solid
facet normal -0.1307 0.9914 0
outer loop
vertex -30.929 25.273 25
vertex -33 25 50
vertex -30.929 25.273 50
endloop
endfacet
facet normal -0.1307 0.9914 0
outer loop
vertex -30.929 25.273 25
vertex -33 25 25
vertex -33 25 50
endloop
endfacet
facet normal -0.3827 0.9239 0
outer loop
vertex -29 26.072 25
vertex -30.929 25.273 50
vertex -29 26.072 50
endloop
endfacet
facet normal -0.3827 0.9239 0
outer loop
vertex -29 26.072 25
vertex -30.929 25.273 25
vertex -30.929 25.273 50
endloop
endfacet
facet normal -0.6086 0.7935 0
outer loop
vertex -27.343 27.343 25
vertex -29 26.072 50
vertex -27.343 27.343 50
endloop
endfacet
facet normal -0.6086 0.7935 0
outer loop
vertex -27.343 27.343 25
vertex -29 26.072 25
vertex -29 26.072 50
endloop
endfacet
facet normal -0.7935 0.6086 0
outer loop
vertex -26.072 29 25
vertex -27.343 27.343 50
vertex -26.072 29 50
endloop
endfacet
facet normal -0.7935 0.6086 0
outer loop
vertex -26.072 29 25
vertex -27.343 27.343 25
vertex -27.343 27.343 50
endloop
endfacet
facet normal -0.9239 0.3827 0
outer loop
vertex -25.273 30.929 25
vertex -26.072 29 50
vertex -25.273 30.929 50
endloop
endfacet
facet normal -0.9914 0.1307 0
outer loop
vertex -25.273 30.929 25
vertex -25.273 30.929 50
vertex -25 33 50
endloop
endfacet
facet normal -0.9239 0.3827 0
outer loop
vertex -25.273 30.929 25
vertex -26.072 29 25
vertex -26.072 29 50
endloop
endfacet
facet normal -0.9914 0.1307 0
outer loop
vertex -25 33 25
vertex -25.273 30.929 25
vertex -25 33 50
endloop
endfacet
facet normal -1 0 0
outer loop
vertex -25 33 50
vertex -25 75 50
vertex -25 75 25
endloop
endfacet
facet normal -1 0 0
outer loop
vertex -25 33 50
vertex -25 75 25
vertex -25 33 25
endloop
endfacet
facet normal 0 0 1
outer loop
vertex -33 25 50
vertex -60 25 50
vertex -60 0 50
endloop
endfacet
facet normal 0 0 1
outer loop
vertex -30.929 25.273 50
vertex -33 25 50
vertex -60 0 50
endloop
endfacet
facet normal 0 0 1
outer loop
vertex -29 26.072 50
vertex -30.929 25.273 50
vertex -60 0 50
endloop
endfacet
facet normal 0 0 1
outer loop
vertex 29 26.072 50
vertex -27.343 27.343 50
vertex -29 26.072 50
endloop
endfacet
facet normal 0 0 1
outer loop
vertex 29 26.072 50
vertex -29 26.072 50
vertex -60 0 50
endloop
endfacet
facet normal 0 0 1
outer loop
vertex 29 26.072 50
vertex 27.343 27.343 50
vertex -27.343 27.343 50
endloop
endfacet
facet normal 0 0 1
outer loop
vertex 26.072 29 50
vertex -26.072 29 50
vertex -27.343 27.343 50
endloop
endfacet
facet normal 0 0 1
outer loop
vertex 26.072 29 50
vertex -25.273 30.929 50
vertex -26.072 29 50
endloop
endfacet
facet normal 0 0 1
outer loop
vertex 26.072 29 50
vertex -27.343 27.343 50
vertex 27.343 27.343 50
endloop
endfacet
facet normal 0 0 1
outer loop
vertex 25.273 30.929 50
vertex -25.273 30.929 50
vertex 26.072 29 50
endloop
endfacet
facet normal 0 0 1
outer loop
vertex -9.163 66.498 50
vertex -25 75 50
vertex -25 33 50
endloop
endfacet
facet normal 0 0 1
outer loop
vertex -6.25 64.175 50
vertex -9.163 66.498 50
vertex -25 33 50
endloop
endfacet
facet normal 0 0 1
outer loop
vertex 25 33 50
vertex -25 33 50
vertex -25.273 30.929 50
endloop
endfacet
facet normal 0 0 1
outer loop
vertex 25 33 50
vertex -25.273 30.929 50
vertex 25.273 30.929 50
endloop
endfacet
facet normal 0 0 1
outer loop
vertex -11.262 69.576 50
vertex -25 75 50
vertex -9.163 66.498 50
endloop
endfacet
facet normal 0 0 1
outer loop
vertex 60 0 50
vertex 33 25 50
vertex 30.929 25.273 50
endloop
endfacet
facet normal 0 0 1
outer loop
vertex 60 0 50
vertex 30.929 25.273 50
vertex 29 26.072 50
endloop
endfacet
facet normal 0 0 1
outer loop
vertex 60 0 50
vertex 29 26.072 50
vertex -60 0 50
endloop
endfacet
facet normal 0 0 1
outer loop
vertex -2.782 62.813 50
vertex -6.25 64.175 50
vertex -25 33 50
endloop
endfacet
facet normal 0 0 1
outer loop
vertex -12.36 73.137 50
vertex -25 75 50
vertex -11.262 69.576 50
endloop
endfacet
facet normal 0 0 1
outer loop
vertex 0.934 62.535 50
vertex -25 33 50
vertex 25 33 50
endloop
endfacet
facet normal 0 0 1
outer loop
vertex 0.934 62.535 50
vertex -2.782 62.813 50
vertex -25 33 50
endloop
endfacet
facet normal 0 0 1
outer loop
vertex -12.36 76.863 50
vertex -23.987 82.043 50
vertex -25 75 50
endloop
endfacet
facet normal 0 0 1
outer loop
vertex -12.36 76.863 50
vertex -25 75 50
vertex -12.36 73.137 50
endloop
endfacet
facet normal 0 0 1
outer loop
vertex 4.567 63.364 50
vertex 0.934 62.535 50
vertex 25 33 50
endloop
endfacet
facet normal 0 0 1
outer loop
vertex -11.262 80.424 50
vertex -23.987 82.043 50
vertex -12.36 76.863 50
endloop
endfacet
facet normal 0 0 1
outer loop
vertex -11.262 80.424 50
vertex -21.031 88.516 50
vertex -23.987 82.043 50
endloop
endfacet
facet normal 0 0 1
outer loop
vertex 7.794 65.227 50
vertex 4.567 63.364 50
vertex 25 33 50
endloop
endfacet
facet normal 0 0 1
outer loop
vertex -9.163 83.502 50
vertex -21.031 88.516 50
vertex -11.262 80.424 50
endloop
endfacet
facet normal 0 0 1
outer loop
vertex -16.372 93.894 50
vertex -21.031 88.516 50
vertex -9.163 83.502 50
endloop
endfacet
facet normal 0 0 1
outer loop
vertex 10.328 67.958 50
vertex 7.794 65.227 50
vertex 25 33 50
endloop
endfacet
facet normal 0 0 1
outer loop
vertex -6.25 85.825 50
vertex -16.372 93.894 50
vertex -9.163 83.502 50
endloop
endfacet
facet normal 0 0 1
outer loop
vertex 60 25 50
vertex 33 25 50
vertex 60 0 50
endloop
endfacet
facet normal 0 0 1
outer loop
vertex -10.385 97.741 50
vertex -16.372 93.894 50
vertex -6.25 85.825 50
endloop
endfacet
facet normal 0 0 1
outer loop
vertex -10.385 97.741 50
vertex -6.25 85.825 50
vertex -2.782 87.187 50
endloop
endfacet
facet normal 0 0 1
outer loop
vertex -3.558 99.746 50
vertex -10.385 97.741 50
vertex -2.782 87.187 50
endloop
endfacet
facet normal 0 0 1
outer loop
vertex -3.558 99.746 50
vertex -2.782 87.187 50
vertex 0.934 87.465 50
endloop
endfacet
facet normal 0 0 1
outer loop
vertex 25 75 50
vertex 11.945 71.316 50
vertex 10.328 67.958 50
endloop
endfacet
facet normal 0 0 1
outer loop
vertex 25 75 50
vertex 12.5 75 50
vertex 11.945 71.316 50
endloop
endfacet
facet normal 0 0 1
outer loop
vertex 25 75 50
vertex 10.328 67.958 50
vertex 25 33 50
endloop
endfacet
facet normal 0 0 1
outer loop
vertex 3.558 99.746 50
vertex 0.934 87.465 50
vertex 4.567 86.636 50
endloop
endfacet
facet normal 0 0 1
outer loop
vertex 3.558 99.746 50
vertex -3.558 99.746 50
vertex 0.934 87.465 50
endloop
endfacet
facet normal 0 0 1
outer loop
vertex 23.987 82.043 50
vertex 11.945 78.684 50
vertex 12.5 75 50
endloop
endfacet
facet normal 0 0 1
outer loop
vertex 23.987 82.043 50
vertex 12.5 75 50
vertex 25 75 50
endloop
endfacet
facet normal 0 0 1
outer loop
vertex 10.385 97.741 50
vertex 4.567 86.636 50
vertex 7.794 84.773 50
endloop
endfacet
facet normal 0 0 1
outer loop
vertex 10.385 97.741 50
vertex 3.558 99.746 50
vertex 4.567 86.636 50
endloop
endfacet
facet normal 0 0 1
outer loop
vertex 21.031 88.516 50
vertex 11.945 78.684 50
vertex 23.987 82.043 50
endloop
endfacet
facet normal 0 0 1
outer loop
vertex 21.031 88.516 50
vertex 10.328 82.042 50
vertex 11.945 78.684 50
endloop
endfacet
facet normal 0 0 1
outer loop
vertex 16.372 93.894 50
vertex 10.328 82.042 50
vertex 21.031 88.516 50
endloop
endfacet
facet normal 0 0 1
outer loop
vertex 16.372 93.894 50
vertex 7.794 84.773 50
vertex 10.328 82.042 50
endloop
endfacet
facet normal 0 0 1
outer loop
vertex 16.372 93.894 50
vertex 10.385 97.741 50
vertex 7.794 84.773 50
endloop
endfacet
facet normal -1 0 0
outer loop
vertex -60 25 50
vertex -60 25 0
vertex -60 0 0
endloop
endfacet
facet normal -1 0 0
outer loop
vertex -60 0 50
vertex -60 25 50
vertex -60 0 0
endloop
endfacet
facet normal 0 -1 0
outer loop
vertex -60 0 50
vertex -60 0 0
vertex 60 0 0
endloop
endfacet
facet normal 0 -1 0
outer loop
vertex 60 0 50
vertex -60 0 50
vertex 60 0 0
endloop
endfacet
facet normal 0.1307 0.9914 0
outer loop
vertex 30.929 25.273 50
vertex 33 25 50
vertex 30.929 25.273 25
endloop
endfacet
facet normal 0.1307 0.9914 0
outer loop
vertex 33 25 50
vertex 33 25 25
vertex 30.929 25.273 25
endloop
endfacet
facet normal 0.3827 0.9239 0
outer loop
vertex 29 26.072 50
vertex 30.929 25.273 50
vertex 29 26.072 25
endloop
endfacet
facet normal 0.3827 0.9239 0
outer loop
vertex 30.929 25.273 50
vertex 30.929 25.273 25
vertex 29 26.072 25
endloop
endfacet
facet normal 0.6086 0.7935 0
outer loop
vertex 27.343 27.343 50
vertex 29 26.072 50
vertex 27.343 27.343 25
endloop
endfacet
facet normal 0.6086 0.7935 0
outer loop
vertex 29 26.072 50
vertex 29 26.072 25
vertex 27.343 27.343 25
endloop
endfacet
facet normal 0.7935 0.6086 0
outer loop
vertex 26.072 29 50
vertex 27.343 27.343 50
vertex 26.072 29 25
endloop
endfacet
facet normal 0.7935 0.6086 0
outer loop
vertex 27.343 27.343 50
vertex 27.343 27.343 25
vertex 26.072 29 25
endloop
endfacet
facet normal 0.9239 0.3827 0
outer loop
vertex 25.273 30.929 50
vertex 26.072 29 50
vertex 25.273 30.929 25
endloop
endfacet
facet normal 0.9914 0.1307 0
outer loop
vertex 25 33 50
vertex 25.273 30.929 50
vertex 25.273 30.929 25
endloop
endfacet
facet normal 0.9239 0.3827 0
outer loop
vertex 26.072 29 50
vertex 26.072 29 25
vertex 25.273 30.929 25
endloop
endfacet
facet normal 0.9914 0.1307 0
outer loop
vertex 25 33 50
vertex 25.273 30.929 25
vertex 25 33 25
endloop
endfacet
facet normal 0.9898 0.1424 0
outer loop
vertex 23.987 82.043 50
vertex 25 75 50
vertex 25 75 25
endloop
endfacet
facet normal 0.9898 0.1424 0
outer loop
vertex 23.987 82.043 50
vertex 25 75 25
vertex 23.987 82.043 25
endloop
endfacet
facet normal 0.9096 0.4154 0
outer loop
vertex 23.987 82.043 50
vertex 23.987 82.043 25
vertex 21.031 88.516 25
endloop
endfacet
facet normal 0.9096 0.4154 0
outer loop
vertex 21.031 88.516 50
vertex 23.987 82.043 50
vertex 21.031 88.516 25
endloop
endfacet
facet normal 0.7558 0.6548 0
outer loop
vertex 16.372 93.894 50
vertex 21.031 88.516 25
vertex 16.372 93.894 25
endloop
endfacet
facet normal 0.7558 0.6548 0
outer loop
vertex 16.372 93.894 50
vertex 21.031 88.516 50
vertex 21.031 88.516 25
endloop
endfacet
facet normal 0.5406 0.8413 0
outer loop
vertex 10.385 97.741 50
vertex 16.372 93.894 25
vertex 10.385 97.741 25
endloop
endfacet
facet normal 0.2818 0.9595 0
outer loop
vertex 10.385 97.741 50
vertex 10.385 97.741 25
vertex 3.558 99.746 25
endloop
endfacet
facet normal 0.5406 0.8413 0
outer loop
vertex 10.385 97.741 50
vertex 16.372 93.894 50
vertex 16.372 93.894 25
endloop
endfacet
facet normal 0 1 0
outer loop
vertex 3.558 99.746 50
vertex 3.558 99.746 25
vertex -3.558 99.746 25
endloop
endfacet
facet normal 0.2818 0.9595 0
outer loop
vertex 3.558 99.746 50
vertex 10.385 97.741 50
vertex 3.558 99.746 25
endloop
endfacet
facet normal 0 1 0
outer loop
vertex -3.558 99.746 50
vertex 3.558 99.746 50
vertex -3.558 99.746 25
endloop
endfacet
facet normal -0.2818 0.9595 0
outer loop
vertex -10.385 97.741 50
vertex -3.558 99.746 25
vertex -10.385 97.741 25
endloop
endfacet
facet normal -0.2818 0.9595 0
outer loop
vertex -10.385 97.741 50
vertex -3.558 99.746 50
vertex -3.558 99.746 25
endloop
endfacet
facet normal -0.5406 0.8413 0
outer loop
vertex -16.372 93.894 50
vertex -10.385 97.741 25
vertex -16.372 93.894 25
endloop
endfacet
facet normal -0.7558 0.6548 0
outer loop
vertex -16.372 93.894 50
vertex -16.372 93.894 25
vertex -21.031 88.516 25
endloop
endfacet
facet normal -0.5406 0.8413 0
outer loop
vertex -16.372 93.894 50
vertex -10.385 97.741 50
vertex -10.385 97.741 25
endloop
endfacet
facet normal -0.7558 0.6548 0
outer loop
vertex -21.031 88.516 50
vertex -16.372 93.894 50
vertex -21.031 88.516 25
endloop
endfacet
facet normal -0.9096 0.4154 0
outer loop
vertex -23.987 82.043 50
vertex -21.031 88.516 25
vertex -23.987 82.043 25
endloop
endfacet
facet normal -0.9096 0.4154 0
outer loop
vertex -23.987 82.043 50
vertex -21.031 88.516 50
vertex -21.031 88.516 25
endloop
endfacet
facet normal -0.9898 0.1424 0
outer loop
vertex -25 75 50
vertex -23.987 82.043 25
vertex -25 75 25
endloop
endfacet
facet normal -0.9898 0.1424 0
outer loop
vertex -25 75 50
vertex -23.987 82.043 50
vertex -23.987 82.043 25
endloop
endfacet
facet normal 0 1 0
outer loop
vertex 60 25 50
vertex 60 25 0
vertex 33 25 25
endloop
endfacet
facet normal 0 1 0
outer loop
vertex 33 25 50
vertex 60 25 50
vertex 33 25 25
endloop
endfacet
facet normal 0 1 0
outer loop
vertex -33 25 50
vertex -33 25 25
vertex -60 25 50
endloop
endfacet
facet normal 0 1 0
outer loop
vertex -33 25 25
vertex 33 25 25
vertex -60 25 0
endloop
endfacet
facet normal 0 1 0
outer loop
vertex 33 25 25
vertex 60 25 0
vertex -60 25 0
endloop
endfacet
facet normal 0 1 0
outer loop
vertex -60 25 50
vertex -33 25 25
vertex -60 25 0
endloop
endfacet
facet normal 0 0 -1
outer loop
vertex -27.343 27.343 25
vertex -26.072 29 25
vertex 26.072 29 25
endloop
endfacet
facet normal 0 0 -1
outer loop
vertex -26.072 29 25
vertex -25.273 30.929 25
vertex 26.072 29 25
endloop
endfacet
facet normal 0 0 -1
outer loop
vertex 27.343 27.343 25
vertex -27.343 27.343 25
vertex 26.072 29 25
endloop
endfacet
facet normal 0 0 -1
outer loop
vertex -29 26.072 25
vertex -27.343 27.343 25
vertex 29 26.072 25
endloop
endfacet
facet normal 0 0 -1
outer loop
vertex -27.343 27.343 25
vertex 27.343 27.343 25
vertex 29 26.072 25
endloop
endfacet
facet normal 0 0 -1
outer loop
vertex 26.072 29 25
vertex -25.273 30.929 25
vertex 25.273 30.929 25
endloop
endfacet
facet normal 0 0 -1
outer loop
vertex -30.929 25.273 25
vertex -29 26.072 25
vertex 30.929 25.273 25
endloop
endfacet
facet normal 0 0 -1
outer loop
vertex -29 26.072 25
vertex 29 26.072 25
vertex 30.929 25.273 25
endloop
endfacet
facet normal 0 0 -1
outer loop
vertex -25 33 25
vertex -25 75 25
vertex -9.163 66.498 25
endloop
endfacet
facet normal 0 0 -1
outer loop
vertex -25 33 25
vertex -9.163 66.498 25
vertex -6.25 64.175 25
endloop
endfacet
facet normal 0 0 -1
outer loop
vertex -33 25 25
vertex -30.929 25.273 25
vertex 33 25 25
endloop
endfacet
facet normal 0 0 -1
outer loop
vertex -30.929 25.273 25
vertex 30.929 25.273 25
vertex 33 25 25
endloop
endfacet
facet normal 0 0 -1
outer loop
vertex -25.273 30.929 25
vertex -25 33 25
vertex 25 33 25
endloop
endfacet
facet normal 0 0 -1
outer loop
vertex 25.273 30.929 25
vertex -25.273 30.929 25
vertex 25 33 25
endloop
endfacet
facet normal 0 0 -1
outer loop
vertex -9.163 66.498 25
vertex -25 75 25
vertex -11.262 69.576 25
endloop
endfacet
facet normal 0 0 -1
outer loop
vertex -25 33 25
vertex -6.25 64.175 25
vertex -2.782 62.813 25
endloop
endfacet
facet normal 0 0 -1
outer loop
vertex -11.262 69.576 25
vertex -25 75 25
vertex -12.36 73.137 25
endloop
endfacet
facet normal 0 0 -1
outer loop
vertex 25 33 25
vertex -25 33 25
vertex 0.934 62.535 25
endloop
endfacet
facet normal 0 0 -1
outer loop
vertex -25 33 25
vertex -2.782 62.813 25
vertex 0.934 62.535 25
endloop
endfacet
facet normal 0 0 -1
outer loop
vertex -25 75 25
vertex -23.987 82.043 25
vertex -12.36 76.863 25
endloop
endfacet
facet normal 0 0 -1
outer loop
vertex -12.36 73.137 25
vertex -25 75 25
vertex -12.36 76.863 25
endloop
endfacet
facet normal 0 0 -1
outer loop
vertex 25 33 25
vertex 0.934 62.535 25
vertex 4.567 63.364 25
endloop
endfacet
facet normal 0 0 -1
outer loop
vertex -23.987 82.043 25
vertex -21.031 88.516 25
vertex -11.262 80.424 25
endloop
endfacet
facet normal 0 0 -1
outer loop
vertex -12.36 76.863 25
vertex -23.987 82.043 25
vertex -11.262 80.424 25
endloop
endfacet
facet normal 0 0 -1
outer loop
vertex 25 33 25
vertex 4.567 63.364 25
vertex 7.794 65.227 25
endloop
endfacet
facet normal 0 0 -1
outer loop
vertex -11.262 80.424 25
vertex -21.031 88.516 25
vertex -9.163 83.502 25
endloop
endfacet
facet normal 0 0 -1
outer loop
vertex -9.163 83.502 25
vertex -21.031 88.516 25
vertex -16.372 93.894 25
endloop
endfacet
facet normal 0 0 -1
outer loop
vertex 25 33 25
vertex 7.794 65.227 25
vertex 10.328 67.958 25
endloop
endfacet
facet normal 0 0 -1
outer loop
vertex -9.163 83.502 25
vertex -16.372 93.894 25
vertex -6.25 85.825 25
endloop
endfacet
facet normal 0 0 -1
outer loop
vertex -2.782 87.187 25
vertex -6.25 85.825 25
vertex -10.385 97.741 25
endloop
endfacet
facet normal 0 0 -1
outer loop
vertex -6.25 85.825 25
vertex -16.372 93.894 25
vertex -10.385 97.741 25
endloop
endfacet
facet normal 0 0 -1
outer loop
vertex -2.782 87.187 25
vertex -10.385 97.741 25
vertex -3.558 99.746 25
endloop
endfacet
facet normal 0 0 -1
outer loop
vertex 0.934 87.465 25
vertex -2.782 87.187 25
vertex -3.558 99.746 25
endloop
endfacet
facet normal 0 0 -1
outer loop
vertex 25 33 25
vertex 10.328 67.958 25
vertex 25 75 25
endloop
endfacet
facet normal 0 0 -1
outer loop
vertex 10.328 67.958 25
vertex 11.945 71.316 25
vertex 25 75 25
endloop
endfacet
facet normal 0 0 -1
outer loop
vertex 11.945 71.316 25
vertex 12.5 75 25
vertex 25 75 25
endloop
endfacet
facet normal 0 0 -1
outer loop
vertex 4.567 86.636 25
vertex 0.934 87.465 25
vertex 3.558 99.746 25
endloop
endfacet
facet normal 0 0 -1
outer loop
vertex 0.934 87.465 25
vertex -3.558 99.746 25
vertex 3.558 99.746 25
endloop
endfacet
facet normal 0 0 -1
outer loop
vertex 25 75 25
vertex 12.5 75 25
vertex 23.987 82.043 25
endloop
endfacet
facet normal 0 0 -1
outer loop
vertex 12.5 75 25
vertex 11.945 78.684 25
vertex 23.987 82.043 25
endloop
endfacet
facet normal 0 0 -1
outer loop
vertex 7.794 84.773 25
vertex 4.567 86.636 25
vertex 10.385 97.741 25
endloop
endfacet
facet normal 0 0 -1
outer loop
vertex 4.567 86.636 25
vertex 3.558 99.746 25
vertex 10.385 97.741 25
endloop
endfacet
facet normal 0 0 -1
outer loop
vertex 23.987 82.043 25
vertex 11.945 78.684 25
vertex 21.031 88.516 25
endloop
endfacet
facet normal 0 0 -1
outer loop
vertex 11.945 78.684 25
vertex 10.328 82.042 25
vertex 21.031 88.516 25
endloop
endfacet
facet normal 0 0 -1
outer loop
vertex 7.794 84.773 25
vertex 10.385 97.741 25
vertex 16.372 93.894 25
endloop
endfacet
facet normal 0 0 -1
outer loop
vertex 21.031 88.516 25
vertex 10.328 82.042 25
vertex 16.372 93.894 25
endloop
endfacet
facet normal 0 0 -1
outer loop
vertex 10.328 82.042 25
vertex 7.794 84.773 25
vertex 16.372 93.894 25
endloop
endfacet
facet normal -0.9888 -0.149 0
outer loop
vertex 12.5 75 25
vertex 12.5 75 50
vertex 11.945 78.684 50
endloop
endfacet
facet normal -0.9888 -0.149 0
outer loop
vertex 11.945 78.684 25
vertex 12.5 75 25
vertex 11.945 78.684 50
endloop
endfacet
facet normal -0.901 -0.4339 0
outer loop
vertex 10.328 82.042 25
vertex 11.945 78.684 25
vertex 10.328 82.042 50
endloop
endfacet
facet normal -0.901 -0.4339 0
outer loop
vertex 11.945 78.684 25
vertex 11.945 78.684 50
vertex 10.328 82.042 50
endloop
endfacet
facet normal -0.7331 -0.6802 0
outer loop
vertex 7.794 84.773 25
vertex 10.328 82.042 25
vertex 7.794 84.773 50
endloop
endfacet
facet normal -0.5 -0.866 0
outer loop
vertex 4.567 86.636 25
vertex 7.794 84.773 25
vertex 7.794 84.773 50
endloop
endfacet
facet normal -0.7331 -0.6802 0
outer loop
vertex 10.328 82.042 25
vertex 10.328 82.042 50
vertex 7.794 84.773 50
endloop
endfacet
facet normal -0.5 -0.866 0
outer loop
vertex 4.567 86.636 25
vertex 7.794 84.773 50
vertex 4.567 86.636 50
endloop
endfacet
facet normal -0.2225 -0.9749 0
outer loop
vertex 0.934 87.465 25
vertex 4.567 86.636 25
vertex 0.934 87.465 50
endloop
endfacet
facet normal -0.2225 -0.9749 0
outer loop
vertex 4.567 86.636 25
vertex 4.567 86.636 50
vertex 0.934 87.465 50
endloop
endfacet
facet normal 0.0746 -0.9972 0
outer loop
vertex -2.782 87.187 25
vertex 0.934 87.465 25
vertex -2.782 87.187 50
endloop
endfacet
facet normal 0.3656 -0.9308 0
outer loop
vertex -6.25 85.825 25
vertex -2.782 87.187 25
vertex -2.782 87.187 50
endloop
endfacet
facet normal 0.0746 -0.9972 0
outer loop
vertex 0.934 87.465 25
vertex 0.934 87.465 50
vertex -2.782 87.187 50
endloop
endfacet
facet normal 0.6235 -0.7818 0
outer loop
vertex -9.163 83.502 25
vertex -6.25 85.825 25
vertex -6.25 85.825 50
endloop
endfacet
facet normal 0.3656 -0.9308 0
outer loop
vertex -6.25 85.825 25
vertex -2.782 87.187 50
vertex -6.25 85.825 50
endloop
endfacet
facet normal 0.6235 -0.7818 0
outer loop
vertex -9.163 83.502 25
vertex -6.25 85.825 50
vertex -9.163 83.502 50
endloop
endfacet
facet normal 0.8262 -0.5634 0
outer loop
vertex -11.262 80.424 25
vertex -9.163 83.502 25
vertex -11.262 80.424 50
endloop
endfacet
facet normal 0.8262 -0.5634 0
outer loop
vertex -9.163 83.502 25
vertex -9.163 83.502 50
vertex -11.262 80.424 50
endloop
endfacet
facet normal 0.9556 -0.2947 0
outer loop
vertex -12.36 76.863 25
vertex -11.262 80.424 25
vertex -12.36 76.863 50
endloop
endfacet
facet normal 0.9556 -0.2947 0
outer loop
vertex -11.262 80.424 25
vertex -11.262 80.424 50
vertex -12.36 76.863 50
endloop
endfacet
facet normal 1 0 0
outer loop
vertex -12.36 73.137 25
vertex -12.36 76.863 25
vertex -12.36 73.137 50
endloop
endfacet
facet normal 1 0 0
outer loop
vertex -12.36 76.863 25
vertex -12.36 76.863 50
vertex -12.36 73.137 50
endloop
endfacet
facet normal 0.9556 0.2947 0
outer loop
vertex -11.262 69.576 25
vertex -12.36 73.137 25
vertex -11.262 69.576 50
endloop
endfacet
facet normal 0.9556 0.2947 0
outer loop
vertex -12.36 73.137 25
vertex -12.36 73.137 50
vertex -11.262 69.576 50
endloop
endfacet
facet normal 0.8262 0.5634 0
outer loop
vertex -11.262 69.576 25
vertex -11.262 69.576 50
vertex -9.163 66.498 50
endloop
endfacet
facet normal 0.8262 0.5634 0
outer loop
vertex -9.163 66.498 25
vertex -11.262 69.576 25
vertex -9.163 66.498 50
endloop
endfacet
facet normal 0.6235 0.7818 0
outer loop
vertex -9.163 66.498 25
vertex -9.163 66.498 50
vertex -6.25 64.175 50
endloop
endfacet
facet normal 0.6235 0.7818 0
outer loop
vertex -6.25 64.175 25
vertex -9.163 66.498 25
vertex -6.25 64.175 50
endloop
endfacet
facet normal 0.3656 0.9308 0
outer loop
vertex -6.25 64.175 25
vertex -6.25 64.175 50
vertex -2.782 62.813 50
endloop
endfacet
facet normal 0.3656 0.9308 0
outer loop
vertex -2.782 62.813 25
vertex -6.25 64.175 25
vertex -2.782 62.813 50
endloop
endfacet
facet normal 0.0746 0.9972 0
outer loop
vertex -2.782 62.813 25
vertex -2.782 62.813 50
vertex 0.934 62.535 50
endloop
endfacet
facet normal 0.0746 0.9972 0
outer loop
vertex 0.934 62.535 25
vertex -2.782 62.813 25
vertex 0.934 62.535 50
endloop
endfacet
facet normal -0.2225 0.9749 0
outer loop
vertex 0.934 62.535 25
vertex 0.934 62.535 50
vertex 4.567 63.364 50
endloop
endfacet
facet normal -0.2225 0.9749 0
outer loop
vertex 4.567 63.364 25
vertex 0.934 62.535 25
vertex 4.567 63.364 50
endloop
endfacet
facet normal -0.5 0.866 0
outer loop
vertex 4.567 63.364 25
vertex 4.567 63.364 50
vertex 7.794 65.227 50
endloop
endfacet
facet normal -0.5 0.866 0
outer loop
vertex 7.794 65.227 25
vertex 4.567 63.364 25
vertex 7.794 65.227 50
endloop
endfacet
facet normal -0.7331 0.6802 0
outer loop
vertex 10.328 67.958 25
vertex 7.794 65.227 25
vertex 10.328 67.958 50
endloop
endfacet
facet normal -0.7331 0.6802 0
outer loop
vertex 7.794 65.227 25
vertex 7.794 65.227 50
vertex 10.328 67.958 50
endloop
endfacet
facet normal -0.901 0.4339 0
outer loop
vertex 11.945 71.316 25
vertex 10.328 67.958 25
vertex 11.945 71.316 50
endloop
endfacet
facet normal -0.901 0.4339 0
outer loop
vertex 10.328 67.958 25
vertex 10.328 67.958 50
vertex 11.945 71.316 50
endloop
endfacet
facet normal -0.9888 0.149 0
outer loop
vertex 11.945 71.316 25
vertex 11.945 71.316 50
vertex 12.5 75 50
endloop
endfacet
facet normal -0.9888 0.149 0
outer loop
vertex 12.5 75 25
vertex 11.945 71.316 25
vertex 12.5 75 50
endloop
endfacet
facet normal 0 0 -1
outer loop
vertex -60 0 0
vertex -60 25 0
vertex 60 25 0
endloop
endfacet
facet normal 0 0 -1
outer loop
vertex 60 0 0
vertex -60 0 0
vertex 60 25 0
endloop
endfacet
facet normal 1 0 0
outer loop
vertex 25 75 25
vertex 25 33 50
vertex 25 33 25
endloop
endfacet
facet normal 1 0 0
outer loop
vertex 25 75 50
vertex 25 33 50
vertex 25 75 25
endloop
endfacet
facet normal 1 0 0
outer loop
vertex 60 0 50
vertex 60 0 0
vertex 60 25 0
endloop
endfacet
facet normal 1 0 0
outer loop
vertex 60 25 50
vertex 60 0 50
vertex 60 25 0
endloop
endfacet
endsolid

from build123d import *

# Parameters (mm, degrees)
BOSS_EXTRUDE3_DEPTH = 50
SKETCH3_R           = 12.5
BOSS_EXTRUDE4_DEPTH = 25
FILLET1_R           = 8


with BuildPart() as part:
    # Sketch1 → Boss-Extrude3 (new body)
    with BuildSketch(Plane.XY):
        Polygon((25, 25), (0, 25), (0, 0), (60, 0), (60, 25), align=None)
        Polygon((0, 0), (0, 25), (-25, 25), (-60, 25), (-60, 0), align=None)
    extrude(amount=BOSS_EXTRUDE3_DEPTH)

    # Sketch3 → Boss-Extrude4 (add)
    with BuildSketch(Plane.XY.offset(50)):
        with BuildLine():
            Line((-25, 75), (-25, 25))
            Line((-25, 25), (25, 25))
            Line((25, 25), (25, 75))
            ThreePointArc((25, 75), (0, 100), (-25, 75))
        make_face()
        with Locations((0, 75)):
            Circle(SKETCH3_R, mode=Mode.SUBTRACT)
    extrude(amount=-BOSS_EXTRUDE4_DEPTH)

    # Fillet1
    fillet1_edges = [part.edges().sort_by_distance(p)[0] for p in [
        (25, 25, 37.5),
        (-25, 25, 37.5),
    ]]
    fillet(fillet1_edges, radius=FILLET1_R)


solid = part.part
